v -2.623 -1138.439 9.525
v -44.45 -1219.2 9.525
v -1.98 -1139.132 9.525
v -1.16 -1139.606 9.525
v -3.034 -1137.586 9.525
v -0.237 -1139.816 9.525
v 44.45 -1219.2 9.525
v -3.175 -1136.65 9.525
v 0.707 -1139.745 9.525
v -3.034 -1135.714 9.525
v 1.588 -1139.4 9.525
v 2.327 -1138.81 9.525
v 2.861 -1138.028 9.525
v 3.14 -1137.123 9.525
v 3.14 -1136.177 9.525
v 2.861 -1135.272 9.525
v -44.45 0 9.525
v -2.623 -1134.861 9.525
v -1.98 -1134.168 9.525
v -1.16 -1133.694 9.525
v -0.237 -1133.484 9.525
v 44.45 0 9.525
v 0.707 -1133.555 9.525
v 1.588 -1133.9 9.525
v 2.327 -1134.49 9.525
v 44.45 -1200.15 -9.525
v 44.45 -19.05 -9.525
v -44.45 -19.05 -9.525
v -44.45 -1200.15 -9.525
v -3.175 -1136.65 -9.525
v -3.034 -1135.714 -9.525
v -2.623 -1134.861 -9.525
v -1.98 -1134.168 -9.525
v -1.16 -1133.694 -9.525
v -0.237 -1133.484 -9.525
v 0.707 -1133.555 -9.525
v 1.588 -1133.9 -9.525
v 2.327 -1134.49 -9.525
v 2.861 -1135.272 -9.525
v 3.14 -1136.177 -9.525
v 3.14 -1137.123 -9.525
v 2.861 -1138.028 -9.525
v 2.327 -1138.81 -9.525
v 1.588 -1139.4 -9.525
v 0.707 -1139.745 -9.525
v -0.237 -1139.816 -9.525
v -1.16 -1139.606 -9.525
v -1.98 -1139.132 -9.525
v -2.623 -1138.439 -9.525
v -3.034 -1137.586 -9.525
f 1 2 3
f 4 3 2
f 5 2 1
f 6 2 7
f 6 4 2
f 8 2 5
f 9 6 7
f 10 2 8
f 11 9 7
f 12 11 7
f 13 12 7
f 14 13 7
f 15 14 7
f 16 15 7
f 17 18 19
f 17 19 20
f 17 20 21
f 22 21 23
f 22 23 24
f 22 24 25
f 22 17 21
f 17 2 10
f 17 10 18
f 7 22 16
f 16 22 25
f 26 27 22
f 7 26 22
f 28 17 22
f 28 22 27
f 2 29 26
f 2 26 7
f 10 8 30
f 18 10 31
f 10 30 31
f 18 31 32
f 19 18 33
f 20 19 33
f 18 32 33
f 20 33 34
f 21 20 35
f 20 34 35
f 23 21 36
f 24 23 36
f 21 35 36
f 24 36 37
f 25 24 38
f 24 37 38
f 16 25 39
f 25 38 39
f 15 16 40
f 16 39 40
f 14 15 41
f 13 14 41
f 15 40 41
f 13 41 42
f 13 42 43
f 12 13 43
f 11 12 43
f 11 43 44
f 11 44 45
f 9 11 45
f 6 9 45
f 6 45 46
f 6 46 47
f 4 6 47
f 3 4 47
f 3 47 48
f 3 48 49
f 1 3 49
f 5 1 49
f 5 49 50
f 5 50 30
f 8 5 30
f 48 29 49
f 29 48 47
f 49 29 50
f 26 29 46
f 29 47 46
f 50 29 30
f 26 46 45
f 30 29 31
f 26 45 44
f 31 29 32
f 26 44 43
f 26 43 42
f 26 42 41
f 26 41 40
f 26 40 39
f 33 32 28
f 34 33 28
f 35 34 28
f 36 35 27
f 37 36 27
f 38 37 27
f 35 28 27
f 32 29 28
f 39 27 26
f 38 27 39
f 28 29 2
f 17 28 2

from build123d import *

# Parameters (mm, degrees)
F0_W     = 88.9
F0_H     = 19.05
F1_DEPTH = 1219.2
F3_DEPTH = 88.901
F5_D     = 6.35


with BuildPart() as f1:
    # F0 (on Front) → F1 (new body)
    with BuildSketch(Plane.XZ):
        Rectangle(F0_W, F0_H)
    extrude(amount=F1_DEPTH)

    # F2 (on face) → F3 (cut, through all)
    with BuildSketch(Plane.YZ.offset(44.45)):
        Polygon((0, -9.525), (0, 9.525), (-19.05, -9.525), align=None)
        Polygon((-1200.15, -9.525), (-1219.2, 9.525), (-1219.2, -9.525), align=None)
    extrude(amount=-F3_DEPTH, mode=Mode.SUBTRACT)

    # F5 (through all)
    with Locations(Plane.XY.offset(9.525)):
        with Locations((0, -1136.65)):
            Hole(F5_D / 2)


solid = f1.part
